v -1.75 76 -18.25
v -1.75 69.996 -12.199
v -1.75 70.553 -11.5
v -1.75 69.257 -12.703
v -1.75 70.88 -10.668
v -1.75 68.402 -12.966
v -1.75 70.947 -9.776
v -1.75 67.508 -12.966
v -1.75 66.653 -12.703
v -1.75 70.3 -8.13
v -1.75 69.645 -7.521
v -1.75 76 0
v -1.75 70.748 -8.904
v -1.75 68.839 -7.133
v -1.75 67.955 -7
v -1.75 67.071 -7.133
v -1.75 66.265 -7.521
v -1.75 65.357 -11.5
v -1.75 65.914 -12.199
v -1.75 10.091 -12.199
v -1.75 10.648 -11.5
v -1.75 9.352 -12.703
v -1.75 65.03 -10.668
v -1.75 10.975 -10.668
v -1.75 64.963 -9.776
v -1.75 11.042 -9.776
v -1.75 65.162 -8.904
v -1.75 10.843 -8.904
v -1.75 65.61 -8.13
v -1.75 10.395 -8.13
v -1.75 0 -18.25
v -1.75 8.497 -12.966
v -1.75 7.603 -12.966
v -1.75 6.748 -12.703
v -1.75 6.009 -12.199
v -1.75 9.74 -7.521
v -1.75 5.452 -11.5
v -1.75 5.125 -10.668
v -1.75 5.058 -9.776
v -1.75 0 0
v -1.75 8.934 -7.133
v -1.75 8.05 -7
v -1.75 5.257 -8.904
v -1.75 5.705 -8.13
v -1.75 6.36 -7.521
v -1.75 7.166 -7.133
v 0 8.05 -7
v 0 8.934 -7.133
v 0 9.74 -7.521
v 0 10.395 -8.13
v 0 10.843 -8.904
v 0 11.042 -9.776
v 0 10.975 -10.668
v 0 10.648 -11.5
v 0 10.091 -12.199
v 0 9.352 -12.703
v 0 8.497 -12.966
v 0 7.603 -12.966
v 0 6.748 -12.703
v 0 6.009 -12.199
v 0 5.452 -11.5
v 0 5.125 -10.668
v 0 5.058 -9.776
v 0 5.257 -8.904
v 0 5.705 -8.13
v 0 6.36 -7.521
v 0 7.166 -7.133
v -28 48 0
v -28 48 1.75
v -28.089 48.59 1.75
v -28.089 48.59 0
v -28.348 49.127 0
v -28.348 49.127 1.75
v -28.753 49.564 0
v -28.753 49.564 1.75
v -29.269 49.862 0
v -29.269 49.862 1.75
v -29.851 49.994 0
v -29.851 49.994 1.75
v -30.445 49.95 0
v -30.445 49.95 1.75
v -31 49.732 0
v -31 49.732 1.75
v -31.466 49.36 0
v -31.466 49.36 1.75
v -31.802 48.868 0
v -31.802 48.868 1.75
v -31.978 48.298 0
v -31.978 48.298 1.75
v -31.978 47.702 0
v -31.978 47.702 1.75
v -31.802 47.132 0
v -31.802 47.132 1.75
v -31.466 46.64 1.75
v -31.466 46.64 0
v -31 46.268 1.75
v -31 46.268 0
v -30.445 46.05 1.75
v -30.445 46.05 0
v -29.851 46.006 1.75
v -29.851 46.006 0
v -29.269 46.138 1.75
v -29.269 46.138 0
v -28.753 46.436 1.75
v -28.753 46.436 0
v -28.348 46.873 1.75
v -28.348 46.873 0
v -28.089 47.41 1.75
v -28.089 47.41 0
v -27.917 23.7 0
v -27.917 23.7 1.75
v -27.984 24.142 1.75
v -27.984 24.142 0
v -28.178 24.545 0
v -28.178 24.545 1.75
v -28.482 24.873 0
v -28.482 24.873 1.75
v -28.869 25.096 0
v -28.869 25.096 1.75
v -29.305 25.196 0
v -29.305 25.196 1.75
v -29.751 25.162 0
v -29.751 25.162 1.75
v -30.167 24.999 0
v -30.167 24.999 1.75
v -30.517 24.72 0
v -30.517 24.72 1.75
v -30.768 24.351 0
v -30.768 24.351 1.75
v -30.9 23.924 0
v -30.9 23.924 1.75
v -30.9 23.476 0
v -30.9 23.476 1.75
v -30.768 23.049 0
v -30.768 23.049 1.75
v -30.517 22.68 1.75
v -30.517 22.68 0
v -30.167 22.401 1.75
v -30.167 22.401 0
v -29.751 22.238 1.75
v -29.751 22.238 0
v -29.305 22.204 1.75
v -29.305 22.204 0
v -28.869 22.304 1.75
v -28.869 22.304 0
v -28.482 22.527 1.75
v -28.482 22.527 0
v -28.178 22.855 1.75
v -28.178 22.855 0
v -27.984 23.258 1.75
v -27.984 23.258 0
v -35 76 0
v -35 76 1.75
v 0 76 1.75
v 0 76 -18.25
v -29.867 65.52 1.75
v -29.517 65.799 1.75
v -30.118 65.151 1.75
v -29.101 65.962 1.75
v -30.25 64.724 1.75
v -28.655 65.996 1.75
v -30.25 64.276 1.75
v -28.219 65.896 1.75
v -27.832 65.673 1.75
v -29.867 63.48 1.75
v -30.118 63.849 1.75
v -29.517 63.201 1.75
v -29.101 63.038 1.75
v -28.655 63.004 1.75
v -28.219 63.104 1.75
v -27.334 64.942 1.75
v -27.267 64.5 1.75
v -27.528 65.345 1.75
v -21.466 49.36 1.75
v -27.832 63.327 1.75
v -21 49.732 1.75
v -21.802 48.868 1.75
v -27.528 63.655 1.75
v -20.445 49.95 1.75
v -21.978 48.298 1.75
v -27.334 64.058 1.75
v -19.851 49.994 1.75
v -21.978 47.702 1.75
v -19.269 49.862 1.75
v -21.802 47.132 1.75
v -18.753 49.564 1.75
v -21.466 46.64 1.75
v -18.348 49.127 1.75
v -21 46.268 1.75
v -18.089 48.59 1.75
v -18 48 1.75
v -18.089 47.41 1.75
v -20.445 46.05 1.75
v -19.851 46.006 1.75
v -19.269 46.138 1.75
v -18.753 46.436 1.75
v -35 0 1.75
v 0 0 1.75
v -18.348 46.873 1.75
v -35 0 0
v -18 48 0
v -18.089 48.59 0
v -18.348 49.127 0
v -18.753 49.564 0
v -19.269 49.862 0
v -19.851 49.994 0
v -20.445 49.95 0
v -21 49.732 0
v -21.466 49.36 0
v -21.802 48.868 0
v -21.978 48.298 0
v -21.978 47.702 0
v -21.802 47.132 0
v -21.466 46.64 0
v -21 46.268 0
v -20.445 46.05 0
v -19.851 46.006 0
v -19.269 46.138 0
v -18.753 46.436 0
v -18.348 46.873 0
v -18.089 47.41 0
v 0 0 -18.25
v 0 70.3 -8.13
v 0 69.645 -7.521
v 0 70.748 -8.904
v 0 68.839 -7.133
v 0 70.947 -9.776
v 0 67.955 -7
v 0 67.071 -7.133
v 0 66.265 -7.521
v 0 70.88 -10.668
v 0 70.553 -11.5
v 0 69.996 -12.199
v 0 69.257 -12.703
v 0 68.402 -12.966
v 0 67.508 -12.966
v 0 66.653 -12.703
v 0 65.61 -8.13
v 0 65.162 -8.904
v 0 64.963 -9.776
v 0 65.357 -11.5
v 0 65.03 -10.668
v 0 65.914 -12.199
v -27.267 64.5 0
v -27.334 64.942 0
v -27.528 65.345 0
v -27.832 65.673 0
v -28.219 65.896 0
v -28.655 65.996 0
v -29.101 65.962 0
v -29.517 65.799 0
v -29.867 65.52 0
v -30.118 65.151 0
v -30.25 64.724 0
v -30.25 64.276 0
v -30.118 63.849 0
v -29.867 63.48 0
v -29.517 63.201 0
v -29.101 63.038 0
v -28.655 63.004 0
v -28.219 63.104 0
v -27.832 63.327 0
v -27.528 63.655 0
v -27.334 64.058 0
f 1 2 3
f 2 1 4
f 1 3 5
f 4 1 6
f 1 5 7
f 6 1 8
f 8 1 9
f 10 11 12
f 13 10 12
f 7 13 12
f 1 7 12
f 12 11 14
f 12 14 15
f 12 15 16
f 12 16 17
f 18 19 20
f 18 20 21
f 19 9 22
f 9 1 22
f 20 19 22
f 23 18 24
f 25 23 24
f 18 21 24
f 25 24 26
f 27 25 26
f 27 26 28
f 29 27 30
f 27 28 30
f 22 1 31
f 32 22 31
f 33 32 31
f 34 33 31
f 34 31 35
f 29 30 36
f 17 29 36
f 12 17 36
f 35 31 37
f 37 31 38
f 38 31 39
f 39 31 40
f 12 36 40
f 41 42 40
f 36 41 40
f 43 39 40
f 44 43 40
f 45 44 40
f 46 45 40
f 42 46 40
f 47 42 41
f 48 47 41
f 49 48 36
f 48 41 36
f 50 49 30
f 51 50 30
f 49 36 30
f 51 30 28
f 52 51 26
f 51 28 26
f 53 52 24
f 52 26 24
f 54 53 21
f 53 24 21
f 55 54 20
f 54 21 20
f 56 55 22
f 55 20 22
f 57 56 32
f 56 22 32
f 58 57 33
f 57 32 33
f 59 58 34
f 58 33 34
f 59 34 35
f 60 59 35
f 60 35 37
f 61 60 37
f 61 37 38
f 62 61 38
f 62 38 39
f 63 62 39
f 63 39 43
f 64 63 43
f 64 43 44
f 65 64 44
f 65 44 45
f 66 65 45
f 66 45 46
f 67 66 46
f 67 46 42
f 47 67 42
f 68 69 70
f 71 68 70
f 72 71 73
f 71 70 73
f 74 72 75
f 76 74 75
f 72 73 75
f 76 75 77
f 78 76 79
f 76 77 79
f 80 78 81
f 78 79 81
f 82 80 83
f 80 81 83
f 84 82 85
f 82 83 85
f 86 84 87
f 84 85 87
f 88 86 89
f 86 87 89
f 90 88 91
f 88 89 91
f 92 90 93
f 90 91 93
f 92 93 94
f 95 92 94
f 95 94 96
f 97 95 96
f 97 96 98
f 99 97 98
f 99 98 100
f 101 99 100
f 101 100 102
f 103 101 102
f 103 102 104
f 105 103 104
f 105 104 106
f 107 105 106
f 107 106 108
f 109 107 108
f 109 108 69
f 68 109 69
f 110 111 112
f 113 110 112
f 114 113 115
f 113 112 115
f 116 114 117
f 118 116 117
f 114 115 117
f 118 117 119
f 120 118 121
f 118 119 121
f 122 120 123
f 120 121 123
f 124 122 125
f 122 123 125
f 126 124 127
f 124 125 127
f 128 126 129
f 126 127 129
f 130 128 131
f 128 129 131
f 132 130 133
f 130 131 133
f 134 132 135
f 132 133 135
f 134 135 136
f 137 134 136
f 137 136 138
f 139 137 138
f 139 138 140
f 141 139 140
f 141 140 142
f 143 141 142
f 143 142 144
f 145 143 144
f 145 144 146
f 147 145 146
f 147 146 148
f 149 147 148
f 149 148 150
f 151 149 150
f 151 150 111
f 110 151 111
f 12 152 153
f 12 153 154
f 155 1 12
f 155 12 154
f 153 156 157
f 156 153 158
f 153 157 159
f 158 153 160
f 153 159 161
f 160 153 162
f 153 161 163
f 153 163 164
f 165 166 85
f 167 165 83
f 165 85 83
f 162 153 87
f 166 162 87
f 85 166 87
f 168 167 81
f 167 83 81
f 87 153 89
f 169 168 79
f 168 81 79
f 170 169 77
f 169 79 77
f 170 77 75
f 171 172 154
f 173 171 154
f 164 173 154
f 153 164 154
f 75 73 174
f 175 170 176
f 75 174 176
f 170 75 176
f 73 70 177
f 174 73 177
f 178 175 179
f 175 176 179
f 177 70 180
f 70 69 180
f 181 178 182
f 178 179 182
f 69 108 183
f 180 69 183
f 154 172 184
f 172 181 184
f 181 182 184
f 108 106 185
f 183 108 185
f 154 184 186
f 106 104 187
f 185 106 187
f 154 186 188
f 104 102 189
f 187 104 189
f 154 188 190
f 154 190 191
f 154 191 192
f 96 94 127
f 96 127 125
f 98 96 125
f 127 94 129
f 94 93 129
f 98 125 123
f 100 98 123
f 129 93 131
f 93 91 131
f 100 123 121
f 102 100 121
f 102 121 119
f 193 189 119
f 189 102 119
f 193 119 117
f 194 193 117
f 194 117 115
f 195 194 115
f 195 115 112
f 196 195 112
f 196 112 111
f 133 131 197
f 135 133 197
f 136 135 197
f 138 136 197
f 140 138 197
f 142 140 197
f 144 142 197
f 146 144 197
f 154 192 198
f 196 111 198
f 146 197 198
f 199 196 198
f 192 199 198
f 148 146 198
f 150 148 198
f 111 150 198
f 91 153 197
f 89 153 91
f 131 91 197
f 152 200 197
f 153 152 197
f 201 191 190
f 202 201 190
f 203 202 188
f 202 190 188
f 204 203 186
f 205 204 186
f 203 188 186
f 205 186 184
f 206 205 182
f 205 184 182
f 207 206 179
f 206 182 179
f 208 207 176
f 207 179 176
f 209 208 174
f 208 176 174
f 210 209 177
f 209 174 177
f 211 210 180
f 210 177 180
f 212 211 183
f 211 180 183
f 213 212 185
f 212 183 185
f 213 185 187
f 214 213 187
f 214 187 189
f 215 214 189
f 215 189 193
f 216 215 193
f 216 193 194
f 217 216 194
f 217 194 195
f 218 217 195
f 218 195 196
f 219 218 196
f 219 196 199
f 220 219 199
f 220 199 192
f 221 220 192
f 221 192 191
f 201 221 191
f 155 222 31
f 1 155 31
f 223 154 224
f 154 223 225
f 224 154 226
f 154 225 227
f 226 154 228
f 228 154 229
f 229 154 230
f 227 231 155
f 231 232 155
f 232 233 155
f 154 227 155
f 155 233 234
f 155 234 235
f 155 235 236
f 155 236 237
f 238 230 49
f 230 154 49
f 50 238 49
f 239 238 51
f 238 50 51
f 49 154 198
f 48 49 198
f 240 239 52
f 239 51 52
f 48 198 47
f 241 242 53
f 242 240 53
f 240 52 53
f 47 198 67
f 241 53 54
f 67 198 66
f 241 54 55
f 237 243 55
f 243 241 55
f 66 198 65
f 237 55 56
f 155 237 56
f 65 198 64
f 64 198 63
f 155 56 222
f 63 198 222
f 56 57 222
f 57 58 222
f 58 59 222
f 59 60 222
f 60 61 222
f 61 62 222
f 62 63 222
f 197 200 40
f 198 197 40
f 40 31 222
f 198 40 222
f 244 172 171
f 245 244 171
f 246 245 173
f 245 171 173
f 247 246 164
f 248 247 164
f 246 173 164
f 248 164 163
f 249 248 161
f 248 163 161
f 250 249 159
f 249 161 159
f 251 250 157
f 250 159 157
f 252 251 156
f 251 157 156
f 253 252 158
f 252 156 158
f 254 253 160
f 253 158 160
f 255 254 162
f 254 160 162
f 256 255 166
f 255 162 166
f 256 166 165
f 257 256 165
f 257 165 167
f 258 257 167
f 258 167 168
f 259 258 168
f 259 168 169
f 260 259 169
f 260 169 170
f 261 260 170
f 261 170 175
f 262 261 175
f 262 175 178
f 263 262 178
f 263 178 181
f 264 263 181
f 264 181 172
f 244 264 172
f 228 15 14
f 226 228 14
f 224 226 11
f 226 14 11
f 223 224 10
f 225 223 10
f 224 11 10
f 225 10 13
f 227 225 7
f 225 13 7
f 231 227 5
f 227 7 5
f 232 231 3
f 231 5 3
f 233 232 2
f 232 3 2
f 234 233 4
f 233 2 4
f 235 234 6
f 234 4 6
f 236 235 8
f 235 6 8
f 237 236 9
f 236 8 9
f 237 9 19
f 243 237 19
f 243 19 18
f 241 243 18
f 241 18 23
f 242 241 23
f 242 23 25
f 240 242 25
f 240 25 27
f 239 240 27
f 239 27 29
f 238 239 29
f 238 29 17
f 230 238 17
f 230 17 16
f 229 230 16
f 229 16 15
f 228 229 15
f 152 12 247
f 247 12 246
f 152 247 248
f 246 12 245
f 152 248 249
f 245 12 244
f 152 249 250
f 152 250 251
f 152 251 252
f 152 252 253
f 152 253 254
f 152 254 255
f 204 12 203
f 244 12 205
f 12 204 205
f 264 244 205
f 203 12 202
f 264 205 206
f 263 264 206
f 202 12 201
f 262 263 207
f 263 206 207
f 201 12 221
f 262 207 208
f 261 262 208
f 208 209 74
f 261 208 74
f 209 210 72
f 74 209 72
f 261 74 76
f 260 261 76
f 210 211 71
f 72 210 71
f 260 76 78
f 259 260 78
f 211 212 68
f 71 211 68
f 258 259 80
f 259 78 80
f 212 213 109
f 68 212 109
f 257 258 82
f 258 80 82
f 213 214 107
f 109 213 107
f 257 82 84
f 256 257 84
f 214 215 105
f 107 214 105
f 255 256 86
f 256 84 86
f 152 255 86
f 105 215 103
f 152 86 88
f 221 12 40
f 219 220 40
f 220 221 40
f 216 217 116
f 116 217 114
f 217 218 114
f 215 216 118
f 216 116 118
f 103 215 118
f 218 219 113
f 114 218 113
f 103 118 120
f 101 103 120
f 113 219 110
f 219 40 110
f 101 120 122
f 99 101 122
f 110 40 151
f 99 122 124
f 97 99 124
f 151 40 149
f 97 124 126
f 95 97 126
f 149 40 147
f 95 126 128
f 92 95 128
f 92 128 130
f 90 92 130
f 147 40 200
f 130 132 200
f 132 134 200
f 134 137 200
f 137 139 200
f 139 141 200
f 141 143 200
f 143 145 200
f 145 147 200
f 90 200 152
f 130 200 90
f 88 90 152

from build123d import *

# Parameters (mm, degrees)
BOSS_EXTRUDE1_DEPTH = 76
CUT_EXTRUDE1_REACH  = 3.75
SKETCH3_R           = 3
CUT_EXTRUDE2_REACH  = 22
SKETCH4_R           = 1.5
SKETCH4_R_2         = 2


with BuildPart() as part:
    # Sketch1 → Boss-Extrude1 (new body)
    with BuildSketch(Plane(origin=(0, 0, 0), x_dir=(1, 0, 0), z_dir=(0, 1, 0))):
        Polygon((-35, 0), (-35, -1.75), (0, -1.75), (0, 18.25), (-1.75, 18.25), (-1.75, 0), align=None)
    extrude(amount=BOSS_EXTRUDE1_DEPTH)

    # Sketch3 → Cut-Extrude1 (cut, up to next)
    with BuildSketch(Plane.ZY.offset(1.75), mode=Mode.PRIVATE) as cut_extrude1_sk1:
        with Locations((-10, 8.05)):
            Circle(SKETCH3_R)
    cut_extrude1_tool1 = extrude(cut_extrude1_sk1.sketch, amount=-CUT_EXTRUDE1_REACH, mode=Mode.PRIVATE) & part.part
    add(cut_extrude1_tool1.solids().sort_by_distance((-1.75, 8.05, -10))[0], mode=Mode.SUBTRACT)
    # Sketch3 → Cut-Extrude1 (cut, up to next)
    with BuildSketch(Plane.ZY.offset(1.75), mode=Mode.PRIVATE) as cut_extrude1_sk2:
        with Locations((-10, 67.955)):
            Circle(SKETCH3_R)
    cut_extrude1_tool2 = extrude(cut_extrude1_sk2.sketch, amount=-CUT_EXTRUDE1_REACH, mode=Mode.PRIVATE) & part.part
    add(cut_extrude1_tool2.solids().sort_by_distance((-1.75, 67.955, -10))[0], mode=Mode.SUBTRACT)

    # Sketch4 → Cut-Extrude2 (cut, up to next)
    with BuildSketch(Plane.XY.offset(1.75), mode=Mode.PRIVATE) as cut_extrude2_sk1:
        with Locations((-28.76701924, 64.5)):
            Circle(SKETCH4_R)
    cut_extrude2_tool1 = extrude(cut_extrude2_sk1.sketch, amount=-CUT_EXTRUDE2_REACH, mode=Mode.PRIVATE) & part.part
    add(cut_extrude2_tool1.solids().sort_by_distance((-28.767019, 64.5, 1.75))[0], mode=Mode.SUBTRACT)
    # Sketch4 → Cut-Extrude2 (cut, up to next)
    with BuildSketch(Plane.XY.offset(1.75), mode=Mode.PRIVATE) as cut_extrude2_sk2:
        with Locations((-29.41701924, 23.7)):
            Circle(SKETCH4_R)
    cut_extrude2_tool2 = extrude(cut_extrude2_sk2.sketch, amount=-CUT_EXTRUDE2_REACH, mode=Mode.PRIVATE) & part.part
    add(cut_extrude2_tool2.solids().sort_by_distance((-29.417019, 23.7, 1.75))[0], mode=Mode.SUBTRACT)
    # Sketch4 → Cut-Extrude2 (cut, up to next)
    with BuildSketch(Plane.XY.offset(1.75), mode=Mode.PRIVATE) as cut_extrude2_sk3:
        with Locations((-30, 48)):
            Circle(SKETCH4_R_2)
    cut_extrude2_tool3 = extrude(cut_extrude2_sk3.sketch, amount=-CUT_EXTRUDE2_REACH, mode=Mode.PRIVATE) & part.part
    add(cut_extrude2_tool3.solids().sort_by_distance((-30, 48, 1.75))[0], mode=Mode.SUBTRACT)
    # Sketch4 → Cut-Extrude2 (cut, up to next)
    with BuildSketch(Plane.XY.offset(1.75), mode=Mode.PRIVATE) as cut_extrude2_sk4:
        with Locations((-20, 48)):
            Circle(SKETCH4_R_2)
    cut_extrude2_tool4 = extrude(cut_extrude2_sk4.sketch, amount=-CUT_EXTRUDE2_REACH, mode=Mode.PRIVATE) & part.part
    add(cut_extrude2_tool4.solids().sort_by_distance((-20, 48, 1.75))[0], mode=Mode.SUBTRACT)


solid = part.part
